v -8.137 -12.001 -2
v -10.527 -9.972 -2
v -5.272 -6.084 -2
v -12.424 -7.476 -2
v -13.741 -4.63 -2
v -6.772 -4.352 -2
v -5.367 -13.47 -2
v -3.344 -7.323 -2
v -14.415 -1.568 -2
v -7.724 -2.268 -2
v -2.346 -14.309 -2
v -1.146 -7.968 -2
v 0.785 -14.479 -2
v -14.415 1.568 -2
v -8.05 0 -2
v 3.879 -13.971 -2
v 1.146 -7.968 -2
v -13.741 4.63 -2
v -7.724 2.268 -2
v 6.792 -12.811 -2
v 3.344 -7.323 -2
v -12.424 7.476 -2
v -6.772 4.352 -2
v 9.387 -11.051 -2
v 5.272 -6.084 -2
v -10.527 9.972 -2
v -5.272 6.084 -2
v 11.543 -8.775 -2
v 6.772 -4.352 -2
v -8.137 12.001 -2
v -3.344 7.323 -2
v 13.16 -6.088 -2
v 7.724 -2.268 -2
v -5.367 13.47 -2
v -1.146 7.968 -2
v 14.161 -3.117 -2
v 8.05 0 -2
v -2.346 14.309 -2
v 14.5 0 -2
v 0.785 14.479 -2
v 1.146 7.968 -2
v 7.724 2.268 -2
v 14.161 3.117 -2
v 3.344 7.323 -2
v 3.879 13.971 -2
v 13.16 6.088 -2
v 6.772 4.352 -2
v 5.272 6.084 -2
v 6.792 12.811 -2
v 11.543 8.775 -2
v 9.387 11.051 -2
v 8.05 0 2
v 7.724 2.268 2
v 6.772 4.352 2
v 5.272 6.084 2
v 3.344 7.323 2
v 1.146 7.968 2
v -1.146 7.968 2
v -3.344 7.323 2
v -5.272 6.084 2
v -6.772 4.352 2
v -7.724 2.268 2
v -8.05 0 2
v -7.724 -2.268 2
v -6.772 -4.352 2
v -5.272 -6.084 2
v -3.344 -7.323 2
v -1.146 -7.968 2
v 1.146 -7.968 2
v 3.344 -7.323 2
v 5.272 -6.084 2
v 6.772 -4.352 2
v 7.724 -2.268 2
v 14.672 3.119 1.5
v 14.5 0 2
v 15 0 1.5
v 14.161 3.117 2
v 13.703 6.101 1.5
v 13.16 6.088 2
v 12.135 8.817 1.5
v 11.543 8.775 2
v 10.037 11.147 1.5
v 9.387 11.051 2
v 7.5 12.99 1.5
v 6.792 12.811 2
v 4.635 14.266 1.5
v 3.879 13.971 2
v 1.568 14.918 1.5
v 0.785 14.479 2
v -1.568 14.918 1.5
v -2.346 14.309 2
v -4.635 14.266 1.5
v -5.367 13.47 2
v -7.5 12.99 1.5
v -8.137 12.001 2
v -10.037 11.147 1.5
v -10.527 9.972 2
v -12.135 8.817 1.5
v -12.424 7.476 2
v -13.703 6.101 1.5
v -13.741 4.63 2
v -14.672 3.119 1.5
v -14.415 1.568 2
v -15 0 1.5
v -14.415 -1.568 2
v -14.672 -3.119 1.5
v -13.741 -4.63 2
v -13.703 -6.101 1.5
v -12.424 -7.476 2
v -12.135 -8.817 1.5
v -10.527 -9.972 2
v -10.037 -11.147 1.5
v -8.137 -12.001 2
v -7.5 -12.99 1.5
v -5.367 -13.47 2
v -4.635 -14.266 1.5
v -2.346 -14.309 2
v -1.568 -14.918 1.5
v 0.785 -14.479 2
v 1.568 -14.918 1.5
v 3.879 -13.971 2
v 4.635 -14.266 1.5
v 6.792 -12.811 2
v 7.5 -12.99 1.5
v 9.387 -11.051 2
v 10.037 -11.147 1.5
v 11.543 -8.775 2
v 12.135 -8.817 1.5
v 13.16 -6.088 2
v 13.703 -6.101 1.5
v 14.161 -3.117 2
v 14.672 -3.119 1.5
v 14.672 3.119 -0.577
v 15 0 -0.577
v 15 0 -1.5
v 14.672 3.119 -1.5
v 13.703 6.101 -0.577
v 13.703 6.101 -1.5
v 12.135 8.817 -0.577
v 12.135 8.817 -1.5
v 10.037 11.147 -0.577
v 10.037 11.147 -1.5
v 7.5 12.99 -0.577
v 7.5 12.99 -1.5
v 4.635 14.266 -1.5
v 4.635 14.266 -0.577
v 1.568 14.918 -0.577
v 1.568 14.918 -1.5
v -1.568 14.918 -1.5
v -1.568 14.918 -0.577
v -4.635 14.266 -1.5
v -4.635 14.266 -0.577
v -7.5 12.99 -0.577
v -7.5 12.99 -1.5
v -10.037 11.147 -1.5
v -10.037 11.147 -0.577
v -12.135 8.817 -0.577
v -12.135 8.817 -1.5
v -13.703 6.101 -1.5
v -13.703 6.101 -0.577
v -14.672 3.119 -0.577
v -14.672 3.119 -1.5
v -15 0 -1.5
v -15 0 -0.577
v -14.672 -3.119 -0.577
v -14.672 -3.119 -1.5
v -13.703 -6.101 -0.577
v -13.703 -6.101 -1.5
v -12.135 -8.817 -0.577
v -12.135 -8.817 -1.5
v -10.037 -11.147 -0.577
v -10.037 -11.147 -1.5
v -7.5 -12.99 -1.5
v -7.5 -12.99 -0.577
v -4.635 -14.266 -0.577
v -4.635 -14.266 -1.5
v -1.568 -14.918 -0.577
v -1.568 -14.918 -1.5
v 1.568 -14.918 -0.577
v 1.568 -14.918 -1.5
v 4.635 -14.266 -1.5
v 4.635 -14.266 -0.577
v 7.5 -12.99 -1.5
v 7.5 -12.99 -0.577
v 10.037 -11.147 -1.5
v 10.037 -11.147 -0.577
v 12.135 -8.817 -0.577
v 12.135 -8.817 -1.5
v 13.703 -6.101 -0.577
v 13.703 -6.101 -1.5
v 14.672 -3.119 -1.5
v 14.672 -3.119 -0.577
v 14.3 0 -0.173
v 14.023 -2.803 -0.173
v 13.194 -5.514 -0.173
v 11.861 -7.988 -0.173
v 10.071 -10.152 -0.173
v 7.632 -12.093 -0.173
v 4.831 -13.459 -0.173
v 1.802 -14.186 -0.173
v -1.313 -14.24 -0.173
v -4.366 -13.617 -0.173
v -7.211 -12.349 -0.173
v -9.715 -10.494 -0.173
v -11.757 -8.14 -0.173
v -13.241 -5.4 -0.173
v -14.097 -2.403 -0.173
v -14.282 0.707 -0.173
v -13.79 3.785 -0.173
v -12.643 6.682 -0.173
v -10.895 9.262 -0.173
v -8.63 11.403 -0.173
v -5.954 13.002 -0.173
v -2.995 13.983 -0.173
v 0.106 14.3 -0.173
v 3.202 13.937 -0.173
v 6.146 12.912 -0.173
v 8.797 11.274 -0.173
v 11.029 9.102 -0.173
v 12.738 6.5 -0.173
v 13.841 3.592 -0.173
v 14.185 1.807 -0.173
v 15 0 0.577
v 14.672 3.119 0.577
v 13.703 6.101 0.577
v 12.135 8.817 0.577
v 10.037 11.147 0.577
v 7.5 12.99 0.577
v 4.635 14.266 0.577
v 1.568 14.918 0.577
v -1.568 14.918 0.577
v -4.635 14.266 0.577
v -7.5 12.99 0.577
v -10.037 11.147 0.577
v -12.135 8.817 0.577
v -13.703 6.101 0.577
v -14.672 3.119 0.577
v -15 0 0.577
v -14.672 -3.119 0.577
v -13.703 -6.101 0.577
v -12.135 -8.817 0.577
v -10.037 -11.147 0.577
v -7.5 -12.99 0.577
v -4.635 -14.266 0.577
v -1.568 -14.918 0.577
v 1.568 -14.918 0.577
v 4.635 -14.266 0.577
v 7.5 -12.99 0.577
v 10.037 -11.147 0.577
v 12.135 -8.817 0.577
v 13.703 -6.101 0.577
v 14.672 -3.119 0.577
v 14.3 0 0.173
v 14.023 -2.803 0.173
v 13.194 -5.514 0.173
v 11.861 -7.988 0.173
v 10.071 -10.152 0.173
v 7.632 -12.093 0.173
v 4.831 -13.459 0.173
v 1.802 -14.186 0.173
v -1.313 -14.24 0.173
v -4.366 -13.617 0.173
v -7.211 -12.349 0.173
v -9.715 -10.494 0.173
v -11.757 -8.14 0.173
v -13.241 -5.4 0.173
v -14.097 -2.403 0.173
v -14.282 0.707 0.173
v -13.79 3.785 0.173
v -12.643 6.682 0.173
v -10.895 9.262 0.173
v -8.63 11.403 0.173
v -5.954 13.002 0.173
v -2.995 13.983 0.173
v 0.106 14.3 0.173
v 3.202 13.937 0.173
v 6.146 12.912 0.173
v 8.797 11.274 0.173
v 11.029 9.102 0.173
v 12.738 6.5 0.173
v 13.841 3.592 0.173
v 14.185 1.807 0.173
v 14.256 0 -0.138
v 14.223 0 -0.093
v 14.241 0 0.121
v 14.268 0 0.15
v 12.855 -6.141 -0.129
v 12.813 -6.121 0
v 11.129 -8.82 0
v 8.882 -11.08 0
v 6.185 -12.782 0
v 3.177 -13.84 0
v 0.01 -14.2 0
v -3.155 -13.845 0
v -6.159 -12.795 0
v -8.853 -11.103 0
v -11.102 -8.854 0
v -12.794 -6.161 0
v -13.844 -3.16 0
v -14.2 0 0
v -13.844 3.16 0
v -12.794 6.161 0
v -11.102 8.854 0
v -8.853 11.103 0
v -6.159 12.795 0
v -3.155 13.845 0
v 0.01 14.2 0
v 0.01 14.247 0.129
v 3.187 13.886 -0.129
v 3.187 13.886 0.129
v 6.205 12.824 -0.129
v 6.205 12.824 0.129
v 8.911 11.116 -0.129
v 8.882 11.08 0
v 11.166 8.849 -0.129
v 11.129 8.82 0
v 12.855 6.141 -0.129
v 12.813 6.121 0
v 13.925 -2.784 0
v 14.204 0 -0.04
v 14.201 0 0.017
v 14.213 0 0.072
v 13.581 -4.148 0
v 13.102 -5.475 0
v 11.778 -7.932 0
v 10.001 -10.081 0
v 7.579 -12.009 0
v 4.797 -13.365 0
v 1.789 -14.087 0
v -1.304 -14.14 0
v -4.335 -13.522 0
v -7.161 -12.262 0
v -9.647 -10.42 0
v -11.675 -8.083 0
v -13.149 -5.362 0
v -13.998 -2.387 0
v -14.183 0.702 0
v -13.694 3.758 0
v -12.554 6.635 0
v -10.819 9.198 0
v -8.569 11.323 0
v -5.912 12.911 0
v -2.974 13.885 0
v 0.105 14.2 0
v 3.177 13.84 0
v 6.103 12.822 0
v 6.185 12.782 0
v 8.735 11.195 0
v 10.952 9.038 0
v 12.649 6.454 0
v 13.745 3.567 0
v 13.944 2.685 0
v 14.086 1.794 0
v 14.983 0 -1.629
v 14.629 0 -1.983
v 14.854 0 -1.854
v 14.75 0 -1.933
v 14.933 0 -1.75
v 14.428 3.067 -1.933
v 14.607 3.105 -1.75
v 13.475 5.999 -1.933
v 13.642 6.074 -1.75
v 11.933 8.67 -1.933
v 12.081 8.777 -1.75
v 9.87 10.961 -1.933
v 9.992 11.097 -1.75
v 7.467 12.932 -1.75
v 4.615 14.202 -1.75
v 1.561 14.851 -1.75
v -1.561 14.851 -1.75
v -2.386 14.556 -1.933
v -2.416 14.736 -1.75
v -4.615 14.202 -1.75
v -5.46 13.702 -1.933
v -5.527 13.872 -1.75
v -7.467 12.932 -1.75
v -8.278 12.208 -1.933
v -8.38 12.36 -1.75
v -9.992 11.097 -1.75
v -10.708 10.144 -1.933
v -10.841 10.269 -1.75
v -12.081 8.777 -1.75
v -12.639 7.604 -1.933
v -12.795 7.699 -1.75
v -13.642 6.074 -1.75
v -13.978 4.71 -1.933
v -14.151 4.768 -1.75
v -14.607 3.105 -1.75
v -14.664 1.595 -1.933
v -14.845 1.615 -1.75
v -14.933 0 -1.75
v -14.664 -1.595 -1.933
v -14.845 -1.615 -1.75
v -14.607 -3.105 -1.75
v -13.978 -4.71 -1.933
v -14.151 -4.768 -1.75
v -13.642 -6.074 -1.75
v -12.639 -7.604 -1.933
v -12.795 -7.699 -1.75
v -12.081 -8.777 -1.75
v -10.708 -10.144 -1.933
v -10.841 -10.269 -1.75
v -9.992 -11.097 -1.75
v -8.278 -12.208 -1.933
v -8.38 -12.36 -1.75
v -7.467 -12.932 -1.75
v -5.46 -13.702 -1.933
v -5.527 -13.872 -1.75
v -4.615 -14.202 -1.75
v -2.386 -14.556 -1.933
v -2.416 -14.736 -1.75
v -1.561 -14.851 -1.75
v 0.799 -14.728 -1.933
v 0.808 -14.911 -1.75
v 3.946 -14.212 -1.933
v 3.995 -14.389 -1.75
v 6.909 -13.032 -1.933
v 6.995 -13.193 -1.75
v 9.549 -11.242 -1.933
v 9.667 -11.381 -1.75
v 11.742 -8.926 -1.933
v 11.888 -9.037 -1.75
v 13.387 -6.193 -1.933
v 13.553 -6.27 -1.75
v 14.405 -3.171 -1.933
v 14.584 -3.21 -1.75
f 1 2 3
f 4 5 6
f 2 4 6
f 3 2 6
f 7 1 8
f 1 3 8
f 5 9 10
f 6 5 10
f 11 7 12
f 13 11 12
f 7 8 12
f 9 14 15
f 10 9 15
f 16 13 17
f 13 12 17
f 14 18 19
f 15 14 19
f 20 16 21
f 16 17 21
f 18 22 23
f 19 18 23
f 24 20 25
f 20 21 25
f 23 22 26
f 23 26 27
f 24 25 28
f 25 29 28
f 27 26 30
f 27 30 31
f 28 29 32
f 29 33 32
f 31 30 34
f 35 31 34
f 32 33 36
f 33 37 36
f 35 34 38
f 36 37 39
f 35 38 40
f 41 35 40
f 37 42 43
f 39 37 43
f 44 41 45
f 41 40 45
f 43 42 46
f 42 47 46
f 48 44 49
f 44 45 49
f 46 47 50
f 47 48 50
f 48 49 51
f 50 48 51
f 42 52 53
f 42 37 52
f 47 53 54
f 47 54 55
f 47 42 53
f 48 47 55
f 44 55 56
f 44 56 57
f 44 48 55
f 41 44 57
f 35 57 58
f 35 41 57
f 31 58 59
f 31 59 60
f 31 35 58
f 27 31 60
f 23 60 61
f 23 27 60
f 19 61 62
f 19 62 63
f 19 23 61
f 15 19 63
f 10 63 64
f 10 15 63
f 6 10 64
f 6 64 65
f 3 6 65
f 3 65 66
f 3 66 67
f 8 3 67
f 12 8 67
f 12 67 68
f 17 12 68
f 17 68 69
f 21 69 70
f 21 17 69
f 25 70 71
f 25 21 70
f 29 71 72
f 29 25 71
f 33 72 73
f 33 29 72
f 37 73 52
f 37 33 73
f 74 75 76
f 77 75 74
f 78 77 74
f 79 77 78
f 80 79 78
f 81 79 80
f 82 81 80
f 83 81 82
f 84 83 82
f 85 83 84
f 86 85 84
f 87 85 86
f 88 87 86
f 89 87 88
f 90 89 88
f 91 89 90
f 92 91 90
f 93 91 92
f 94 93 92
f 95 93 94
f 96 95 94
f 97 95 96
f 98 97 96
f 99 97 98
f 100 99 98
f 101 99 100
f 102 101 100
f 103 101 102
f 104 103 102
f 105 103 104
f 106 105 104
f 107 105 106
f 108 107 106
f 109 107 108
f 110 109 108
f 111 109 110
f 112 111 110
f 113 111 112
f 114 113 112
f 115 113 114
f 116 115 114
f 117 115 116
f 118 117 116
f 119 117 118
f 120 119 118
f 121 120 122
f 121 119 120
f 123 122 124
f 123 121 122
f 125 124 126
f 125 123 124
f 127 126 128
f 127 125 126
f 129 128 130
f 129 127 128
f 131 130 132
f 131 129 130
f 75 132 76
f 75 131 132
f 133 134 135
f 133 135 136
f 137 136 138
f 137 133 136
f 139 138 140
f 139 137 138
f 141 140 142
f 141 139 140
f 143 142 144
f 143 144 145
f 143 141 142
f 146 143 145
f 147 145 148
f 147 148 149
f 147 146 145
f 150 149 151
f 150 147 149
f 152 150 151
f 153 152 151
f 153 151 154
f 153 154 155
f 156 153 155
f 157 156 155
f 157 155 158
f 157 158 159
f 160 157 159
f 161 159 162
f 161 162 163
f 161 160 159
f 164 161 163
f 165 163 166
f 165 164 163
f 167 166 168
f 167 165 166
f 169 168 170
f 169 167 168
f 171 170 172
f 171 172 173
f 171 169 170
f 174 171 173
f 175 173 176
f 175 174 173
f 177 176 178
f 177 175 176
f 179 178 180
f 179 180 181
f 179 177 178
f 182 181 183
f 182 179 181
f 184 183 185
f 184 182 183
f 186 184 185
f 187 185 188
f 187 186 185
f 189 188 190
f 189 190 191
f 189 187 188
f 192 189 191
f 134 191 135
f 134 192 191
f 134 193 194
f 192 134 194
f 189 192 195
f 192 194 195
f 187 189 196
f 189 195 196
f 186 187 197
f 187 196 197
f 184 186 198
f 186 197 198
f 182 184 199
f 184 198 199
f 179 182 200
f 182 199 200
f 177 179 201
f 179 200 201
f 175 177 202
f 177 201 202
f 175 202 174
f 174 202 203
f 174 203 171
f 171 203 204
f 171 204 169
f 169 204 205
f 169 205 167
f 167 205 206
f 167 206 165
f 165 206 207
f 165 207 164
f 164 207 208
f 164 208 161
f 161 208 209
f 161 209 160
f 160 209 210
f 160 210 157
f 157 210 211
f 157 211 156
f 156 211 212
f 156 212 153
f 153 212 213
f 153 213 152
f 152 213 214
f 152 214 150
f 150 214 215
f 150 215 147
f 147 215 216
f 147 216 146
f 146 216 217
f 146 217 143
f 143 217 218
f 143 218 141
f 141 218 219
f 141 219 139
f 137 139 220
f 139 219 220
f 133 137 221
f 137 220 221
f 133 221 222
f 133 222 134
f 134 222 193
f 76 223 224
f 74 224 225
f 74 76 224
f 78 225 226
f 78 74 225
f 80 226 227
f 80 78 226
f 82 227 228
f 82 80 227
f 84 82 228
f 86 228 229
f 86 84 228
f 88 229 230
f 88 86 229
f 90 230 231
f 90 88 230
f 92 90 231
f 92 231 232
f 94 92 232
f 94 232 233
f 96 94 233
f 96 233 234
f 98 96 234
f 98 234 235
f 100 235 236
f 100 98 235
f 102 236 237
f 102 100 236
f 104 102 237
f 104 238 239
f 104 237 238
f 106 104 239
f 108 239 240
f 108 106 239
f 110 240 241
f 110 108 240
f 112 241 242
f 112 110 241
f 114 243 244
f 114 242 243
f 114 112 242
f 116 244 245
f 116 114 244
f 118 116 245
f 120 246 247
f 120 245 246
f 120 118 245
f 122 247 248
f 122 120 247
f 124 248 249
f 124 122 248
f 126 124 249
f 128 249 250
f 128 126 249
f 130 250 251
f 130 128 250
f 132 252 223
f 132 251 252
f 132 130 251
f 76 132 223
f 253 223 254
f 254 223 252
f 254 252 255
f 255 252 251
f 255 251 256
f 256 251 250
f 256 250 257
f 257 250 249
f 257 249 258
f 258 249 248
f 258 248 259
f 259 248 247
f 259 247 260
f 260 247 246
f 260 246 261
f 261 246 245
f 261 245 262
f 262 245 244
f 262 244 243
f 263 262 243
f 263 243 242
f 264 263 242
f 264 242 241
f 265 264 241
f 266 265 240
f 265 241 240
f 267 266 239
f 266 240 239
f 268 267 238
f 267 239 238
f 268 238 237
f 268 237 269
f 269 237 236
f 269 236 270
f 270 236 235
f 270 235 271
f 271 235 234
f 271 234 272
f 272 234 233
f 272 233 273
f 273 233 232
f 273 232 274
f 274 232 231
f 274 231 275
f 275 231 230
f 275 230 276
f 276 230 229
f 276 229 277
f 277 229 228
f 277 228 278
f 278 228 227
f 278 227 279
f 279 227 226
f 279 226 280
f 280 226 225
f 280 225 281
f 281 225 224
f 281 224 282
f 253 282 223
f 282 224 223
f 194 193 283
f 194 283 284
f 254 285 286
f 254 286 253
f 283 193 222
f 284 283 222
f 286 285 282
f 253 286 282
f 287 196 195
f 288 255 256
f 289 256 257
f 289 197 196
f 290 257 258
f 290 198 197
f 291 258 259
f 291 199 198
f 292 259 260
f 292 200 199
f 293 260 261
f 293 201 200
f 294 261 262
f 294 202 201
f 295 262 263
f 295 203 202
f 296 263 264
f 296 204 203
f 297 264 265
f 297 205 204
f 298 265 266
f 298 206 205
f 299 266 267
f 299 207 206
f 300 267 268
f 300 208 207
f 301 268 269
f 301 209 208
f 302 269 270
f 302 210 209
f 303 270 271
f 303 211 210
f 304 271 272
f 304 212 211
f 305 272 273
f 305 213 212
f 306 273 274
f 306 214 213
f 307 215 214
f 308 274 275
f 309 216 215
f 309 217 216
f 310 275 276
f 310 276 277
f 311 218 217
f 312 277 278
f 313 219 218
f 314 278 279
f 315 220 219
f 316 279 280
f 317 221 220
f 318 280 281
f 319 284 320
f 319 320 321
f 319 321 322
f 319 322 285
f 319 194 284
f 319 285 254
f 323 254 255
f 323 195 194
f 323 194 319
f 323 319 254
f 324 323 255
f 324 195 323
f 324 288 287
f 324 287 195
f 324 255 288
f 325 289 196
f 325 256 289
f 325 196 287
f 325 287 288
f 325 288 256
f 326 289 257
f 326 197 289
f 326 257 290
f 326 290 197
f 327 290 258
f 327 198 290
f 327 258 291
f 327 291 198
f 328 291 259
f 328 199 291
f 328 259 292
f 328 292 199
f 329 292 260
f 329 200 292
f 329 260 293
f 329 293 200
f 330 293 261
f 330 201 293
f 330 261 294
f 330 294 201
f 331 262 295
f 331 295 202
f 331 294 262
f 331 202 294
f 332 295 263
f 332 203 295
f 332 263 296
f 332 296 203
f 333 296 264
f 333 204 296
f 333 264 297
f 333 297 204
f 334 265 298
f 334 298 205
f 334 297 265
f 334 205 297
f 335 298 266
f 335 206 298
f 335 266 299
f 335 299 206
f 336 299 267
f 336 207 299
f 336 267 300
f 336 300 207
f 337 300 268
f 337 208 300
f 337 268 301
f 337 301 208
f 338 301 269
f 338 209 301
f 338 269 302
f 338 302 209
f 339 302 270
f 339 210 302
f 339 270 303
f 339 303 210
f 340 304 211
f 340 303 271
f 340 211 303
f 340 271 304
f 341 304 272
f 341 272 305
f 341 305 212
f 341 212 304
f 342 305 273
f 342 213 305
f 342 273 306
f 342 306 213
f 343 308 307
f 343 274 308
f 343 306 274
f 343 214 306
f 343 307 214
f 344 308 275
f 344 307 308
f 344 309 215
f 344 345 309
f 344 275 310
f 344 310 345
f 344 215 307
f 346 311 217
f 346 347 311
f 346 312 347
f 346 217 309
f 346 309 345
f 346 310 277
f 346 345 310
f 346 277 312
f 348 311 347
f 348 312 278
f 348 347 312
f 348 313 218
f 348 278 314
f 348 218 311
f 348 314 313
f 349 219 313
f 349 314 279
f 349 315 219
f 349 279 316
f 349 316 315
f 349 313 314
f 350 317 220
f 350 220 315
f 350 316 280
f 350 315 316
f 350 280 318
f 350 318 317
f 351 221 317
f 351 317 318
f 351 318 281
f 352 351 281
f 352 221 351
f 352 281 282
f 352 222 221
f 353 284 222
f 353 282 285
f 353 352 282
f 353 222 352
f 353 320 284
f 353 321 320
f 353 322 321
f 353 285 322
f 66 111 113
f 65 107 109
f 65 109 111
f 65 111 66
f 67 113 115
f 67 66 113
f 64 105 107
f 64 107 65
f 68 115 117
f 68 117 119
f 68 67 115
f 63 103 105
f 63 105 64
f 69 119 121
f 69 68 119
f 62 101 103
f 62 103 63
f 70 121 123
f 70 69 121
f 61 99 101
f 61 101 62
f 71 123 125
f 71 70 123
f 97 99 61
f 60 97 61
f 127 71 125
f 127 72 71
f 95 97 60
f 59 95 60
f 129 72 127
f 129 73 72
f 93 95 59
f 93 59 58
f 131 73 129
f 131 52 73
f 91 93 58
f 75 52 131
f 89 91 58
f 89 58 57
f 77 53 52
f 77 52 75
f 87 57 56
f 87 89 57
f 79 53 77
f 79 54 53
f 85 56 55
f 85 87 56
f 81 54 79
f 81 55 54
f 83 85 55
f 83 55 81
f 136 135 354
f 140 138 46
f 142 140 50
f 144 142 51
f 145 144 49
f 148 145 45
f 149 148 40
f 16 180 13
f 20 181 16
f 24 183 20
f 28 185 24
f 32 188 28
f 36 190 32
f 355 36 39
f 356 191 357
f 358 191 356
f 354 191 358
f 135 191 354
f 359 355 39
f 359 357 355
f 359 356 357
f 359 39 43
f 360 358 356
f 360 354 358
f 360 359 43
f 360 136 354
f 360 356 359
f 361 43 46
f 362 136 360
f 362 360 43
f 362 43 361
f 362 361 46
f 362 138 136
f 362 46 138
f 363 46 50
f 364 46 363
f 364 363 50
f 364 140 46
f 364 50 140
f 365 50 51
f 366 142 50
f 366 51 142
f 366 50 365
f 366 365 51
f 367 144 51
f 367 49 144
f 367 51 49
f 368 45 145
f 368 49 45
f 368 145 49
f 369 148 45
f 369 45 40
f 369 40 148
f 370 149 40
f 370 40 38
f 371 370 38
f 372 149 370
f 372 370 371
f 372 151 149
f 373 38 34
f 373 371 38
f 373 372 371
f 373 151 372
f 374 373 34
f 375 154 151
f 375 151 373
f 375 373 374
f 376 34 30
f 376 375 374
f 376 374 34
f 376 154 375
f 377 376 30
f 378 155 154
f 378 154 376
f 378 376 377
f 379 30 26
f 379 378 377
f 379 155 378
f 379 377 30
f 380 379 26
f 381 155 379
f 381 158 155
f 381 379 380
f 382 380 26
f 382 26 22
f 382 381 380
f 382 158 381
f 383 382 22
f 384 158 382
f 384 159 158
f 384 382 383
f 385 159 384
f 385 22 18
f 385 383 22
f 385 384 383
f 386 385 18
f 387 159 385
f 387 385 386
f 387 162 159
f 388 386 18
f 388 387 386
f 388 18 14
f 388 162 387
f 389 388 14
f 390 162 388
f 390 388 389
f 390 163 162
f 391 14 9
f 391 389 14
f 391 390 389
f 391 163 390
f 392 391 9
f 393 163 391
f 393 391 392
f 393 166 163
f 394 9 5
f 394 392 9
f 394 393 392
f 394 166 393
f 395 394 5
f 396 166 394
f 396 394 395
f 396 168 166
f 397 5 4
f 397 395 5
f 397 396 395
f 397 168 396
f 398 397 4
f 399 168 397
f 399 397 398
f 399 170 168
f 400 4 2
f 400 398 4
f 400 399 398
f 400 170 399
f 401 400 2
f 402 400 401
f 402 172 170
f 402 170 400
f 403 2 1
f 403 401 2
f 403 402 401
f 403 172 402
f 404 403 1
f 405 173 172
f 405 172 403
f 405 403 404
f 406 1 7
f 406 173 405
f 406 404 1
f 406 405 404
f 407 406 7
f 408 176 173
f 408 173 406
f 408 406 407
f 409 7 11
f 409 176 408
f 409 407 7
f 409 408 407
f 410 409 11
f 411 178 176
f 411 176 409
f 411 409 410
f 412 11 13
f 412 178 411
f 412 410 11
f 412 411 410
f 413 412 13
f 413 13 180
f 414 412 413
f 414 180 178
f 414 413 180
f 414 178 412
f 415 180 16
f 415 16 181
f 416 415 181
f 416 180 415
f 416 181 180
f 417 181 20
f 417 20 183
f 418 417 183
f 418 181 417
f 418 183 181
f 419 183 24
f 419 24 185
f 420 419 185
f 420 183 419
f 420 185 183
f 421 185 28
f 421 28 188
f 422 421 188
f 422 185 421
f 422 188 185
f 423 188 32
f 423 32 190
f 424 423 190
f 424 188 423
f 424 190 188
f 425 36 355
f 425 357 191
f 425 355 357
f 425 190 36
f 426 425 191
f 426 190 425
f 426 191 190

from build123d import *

# Parameters (mm, degrees)
SKETCH_1_R      = 15
SKETCH_1_R_2    = 8.05
EXTRUDE_2_DEPTH = 2
FILLET_1_R      = 0.2
CHAMFER_1_SIZE  = 0.5
FILLET_2_R      = 0.5


with BuildPart() as part:
    # Эскиз1 → Бобышка-Вытянуть2 (new, symmetric)
    with BuildSketch(Plane.XY):
        Circle(SKETCH_1_R)
        Circle(SKETCH_1_R_2, mode=Mode.SUBTRACT)
    extrude(amount=EXTRUDE_2_DEPTH, both=True)

    # Эскиз2 → Вырез-Повернуть1 (revolve, cut)
    with BuildSketch(Plane(origin=(0, 0, 0), x_dir=(0, 0, -1), z_dir=(1, 0, 0)), mode=Mode.PRIVATE) as cut_revolve_1_sk:
        Polygon((-0.577350269, 15), (0.577350269, 15), (0, 14), align=None)
    revolve(cut_revolve_1_sk.sketch.rotate(Axis((0, 0, 3.24866267), (0, 0, -1)), 90), axis=Axis((0, 0, 3.24866267), (0, 0, -1)), mode=Mode.SUBTRACT)

    # Скругление1
    fillet_1_edges = [part.edges().sort_by_distance(p)[0] for p in [
        (-14, 0, 0),
    ]]
    fillet(fillet_1_edges, radius=FILLET_1_R)

    # Фаска1
    chamfer_1_edges = [part.edges().sort_by_distance(p)[0] for p in [
        (-15, 0, 2),
    ]]
    chamfer(chamfer_1_edges, length=CHAMFER_1_SIZE)

    # Скругление2
    fillet_2_edges = [part.edges().sort_by_distance(p)[0] for p in [
        (-15, 0, -2),
    ]]
    fillet(fillet_2_edges, radius=FILLET_2_R)


solid = part.part
